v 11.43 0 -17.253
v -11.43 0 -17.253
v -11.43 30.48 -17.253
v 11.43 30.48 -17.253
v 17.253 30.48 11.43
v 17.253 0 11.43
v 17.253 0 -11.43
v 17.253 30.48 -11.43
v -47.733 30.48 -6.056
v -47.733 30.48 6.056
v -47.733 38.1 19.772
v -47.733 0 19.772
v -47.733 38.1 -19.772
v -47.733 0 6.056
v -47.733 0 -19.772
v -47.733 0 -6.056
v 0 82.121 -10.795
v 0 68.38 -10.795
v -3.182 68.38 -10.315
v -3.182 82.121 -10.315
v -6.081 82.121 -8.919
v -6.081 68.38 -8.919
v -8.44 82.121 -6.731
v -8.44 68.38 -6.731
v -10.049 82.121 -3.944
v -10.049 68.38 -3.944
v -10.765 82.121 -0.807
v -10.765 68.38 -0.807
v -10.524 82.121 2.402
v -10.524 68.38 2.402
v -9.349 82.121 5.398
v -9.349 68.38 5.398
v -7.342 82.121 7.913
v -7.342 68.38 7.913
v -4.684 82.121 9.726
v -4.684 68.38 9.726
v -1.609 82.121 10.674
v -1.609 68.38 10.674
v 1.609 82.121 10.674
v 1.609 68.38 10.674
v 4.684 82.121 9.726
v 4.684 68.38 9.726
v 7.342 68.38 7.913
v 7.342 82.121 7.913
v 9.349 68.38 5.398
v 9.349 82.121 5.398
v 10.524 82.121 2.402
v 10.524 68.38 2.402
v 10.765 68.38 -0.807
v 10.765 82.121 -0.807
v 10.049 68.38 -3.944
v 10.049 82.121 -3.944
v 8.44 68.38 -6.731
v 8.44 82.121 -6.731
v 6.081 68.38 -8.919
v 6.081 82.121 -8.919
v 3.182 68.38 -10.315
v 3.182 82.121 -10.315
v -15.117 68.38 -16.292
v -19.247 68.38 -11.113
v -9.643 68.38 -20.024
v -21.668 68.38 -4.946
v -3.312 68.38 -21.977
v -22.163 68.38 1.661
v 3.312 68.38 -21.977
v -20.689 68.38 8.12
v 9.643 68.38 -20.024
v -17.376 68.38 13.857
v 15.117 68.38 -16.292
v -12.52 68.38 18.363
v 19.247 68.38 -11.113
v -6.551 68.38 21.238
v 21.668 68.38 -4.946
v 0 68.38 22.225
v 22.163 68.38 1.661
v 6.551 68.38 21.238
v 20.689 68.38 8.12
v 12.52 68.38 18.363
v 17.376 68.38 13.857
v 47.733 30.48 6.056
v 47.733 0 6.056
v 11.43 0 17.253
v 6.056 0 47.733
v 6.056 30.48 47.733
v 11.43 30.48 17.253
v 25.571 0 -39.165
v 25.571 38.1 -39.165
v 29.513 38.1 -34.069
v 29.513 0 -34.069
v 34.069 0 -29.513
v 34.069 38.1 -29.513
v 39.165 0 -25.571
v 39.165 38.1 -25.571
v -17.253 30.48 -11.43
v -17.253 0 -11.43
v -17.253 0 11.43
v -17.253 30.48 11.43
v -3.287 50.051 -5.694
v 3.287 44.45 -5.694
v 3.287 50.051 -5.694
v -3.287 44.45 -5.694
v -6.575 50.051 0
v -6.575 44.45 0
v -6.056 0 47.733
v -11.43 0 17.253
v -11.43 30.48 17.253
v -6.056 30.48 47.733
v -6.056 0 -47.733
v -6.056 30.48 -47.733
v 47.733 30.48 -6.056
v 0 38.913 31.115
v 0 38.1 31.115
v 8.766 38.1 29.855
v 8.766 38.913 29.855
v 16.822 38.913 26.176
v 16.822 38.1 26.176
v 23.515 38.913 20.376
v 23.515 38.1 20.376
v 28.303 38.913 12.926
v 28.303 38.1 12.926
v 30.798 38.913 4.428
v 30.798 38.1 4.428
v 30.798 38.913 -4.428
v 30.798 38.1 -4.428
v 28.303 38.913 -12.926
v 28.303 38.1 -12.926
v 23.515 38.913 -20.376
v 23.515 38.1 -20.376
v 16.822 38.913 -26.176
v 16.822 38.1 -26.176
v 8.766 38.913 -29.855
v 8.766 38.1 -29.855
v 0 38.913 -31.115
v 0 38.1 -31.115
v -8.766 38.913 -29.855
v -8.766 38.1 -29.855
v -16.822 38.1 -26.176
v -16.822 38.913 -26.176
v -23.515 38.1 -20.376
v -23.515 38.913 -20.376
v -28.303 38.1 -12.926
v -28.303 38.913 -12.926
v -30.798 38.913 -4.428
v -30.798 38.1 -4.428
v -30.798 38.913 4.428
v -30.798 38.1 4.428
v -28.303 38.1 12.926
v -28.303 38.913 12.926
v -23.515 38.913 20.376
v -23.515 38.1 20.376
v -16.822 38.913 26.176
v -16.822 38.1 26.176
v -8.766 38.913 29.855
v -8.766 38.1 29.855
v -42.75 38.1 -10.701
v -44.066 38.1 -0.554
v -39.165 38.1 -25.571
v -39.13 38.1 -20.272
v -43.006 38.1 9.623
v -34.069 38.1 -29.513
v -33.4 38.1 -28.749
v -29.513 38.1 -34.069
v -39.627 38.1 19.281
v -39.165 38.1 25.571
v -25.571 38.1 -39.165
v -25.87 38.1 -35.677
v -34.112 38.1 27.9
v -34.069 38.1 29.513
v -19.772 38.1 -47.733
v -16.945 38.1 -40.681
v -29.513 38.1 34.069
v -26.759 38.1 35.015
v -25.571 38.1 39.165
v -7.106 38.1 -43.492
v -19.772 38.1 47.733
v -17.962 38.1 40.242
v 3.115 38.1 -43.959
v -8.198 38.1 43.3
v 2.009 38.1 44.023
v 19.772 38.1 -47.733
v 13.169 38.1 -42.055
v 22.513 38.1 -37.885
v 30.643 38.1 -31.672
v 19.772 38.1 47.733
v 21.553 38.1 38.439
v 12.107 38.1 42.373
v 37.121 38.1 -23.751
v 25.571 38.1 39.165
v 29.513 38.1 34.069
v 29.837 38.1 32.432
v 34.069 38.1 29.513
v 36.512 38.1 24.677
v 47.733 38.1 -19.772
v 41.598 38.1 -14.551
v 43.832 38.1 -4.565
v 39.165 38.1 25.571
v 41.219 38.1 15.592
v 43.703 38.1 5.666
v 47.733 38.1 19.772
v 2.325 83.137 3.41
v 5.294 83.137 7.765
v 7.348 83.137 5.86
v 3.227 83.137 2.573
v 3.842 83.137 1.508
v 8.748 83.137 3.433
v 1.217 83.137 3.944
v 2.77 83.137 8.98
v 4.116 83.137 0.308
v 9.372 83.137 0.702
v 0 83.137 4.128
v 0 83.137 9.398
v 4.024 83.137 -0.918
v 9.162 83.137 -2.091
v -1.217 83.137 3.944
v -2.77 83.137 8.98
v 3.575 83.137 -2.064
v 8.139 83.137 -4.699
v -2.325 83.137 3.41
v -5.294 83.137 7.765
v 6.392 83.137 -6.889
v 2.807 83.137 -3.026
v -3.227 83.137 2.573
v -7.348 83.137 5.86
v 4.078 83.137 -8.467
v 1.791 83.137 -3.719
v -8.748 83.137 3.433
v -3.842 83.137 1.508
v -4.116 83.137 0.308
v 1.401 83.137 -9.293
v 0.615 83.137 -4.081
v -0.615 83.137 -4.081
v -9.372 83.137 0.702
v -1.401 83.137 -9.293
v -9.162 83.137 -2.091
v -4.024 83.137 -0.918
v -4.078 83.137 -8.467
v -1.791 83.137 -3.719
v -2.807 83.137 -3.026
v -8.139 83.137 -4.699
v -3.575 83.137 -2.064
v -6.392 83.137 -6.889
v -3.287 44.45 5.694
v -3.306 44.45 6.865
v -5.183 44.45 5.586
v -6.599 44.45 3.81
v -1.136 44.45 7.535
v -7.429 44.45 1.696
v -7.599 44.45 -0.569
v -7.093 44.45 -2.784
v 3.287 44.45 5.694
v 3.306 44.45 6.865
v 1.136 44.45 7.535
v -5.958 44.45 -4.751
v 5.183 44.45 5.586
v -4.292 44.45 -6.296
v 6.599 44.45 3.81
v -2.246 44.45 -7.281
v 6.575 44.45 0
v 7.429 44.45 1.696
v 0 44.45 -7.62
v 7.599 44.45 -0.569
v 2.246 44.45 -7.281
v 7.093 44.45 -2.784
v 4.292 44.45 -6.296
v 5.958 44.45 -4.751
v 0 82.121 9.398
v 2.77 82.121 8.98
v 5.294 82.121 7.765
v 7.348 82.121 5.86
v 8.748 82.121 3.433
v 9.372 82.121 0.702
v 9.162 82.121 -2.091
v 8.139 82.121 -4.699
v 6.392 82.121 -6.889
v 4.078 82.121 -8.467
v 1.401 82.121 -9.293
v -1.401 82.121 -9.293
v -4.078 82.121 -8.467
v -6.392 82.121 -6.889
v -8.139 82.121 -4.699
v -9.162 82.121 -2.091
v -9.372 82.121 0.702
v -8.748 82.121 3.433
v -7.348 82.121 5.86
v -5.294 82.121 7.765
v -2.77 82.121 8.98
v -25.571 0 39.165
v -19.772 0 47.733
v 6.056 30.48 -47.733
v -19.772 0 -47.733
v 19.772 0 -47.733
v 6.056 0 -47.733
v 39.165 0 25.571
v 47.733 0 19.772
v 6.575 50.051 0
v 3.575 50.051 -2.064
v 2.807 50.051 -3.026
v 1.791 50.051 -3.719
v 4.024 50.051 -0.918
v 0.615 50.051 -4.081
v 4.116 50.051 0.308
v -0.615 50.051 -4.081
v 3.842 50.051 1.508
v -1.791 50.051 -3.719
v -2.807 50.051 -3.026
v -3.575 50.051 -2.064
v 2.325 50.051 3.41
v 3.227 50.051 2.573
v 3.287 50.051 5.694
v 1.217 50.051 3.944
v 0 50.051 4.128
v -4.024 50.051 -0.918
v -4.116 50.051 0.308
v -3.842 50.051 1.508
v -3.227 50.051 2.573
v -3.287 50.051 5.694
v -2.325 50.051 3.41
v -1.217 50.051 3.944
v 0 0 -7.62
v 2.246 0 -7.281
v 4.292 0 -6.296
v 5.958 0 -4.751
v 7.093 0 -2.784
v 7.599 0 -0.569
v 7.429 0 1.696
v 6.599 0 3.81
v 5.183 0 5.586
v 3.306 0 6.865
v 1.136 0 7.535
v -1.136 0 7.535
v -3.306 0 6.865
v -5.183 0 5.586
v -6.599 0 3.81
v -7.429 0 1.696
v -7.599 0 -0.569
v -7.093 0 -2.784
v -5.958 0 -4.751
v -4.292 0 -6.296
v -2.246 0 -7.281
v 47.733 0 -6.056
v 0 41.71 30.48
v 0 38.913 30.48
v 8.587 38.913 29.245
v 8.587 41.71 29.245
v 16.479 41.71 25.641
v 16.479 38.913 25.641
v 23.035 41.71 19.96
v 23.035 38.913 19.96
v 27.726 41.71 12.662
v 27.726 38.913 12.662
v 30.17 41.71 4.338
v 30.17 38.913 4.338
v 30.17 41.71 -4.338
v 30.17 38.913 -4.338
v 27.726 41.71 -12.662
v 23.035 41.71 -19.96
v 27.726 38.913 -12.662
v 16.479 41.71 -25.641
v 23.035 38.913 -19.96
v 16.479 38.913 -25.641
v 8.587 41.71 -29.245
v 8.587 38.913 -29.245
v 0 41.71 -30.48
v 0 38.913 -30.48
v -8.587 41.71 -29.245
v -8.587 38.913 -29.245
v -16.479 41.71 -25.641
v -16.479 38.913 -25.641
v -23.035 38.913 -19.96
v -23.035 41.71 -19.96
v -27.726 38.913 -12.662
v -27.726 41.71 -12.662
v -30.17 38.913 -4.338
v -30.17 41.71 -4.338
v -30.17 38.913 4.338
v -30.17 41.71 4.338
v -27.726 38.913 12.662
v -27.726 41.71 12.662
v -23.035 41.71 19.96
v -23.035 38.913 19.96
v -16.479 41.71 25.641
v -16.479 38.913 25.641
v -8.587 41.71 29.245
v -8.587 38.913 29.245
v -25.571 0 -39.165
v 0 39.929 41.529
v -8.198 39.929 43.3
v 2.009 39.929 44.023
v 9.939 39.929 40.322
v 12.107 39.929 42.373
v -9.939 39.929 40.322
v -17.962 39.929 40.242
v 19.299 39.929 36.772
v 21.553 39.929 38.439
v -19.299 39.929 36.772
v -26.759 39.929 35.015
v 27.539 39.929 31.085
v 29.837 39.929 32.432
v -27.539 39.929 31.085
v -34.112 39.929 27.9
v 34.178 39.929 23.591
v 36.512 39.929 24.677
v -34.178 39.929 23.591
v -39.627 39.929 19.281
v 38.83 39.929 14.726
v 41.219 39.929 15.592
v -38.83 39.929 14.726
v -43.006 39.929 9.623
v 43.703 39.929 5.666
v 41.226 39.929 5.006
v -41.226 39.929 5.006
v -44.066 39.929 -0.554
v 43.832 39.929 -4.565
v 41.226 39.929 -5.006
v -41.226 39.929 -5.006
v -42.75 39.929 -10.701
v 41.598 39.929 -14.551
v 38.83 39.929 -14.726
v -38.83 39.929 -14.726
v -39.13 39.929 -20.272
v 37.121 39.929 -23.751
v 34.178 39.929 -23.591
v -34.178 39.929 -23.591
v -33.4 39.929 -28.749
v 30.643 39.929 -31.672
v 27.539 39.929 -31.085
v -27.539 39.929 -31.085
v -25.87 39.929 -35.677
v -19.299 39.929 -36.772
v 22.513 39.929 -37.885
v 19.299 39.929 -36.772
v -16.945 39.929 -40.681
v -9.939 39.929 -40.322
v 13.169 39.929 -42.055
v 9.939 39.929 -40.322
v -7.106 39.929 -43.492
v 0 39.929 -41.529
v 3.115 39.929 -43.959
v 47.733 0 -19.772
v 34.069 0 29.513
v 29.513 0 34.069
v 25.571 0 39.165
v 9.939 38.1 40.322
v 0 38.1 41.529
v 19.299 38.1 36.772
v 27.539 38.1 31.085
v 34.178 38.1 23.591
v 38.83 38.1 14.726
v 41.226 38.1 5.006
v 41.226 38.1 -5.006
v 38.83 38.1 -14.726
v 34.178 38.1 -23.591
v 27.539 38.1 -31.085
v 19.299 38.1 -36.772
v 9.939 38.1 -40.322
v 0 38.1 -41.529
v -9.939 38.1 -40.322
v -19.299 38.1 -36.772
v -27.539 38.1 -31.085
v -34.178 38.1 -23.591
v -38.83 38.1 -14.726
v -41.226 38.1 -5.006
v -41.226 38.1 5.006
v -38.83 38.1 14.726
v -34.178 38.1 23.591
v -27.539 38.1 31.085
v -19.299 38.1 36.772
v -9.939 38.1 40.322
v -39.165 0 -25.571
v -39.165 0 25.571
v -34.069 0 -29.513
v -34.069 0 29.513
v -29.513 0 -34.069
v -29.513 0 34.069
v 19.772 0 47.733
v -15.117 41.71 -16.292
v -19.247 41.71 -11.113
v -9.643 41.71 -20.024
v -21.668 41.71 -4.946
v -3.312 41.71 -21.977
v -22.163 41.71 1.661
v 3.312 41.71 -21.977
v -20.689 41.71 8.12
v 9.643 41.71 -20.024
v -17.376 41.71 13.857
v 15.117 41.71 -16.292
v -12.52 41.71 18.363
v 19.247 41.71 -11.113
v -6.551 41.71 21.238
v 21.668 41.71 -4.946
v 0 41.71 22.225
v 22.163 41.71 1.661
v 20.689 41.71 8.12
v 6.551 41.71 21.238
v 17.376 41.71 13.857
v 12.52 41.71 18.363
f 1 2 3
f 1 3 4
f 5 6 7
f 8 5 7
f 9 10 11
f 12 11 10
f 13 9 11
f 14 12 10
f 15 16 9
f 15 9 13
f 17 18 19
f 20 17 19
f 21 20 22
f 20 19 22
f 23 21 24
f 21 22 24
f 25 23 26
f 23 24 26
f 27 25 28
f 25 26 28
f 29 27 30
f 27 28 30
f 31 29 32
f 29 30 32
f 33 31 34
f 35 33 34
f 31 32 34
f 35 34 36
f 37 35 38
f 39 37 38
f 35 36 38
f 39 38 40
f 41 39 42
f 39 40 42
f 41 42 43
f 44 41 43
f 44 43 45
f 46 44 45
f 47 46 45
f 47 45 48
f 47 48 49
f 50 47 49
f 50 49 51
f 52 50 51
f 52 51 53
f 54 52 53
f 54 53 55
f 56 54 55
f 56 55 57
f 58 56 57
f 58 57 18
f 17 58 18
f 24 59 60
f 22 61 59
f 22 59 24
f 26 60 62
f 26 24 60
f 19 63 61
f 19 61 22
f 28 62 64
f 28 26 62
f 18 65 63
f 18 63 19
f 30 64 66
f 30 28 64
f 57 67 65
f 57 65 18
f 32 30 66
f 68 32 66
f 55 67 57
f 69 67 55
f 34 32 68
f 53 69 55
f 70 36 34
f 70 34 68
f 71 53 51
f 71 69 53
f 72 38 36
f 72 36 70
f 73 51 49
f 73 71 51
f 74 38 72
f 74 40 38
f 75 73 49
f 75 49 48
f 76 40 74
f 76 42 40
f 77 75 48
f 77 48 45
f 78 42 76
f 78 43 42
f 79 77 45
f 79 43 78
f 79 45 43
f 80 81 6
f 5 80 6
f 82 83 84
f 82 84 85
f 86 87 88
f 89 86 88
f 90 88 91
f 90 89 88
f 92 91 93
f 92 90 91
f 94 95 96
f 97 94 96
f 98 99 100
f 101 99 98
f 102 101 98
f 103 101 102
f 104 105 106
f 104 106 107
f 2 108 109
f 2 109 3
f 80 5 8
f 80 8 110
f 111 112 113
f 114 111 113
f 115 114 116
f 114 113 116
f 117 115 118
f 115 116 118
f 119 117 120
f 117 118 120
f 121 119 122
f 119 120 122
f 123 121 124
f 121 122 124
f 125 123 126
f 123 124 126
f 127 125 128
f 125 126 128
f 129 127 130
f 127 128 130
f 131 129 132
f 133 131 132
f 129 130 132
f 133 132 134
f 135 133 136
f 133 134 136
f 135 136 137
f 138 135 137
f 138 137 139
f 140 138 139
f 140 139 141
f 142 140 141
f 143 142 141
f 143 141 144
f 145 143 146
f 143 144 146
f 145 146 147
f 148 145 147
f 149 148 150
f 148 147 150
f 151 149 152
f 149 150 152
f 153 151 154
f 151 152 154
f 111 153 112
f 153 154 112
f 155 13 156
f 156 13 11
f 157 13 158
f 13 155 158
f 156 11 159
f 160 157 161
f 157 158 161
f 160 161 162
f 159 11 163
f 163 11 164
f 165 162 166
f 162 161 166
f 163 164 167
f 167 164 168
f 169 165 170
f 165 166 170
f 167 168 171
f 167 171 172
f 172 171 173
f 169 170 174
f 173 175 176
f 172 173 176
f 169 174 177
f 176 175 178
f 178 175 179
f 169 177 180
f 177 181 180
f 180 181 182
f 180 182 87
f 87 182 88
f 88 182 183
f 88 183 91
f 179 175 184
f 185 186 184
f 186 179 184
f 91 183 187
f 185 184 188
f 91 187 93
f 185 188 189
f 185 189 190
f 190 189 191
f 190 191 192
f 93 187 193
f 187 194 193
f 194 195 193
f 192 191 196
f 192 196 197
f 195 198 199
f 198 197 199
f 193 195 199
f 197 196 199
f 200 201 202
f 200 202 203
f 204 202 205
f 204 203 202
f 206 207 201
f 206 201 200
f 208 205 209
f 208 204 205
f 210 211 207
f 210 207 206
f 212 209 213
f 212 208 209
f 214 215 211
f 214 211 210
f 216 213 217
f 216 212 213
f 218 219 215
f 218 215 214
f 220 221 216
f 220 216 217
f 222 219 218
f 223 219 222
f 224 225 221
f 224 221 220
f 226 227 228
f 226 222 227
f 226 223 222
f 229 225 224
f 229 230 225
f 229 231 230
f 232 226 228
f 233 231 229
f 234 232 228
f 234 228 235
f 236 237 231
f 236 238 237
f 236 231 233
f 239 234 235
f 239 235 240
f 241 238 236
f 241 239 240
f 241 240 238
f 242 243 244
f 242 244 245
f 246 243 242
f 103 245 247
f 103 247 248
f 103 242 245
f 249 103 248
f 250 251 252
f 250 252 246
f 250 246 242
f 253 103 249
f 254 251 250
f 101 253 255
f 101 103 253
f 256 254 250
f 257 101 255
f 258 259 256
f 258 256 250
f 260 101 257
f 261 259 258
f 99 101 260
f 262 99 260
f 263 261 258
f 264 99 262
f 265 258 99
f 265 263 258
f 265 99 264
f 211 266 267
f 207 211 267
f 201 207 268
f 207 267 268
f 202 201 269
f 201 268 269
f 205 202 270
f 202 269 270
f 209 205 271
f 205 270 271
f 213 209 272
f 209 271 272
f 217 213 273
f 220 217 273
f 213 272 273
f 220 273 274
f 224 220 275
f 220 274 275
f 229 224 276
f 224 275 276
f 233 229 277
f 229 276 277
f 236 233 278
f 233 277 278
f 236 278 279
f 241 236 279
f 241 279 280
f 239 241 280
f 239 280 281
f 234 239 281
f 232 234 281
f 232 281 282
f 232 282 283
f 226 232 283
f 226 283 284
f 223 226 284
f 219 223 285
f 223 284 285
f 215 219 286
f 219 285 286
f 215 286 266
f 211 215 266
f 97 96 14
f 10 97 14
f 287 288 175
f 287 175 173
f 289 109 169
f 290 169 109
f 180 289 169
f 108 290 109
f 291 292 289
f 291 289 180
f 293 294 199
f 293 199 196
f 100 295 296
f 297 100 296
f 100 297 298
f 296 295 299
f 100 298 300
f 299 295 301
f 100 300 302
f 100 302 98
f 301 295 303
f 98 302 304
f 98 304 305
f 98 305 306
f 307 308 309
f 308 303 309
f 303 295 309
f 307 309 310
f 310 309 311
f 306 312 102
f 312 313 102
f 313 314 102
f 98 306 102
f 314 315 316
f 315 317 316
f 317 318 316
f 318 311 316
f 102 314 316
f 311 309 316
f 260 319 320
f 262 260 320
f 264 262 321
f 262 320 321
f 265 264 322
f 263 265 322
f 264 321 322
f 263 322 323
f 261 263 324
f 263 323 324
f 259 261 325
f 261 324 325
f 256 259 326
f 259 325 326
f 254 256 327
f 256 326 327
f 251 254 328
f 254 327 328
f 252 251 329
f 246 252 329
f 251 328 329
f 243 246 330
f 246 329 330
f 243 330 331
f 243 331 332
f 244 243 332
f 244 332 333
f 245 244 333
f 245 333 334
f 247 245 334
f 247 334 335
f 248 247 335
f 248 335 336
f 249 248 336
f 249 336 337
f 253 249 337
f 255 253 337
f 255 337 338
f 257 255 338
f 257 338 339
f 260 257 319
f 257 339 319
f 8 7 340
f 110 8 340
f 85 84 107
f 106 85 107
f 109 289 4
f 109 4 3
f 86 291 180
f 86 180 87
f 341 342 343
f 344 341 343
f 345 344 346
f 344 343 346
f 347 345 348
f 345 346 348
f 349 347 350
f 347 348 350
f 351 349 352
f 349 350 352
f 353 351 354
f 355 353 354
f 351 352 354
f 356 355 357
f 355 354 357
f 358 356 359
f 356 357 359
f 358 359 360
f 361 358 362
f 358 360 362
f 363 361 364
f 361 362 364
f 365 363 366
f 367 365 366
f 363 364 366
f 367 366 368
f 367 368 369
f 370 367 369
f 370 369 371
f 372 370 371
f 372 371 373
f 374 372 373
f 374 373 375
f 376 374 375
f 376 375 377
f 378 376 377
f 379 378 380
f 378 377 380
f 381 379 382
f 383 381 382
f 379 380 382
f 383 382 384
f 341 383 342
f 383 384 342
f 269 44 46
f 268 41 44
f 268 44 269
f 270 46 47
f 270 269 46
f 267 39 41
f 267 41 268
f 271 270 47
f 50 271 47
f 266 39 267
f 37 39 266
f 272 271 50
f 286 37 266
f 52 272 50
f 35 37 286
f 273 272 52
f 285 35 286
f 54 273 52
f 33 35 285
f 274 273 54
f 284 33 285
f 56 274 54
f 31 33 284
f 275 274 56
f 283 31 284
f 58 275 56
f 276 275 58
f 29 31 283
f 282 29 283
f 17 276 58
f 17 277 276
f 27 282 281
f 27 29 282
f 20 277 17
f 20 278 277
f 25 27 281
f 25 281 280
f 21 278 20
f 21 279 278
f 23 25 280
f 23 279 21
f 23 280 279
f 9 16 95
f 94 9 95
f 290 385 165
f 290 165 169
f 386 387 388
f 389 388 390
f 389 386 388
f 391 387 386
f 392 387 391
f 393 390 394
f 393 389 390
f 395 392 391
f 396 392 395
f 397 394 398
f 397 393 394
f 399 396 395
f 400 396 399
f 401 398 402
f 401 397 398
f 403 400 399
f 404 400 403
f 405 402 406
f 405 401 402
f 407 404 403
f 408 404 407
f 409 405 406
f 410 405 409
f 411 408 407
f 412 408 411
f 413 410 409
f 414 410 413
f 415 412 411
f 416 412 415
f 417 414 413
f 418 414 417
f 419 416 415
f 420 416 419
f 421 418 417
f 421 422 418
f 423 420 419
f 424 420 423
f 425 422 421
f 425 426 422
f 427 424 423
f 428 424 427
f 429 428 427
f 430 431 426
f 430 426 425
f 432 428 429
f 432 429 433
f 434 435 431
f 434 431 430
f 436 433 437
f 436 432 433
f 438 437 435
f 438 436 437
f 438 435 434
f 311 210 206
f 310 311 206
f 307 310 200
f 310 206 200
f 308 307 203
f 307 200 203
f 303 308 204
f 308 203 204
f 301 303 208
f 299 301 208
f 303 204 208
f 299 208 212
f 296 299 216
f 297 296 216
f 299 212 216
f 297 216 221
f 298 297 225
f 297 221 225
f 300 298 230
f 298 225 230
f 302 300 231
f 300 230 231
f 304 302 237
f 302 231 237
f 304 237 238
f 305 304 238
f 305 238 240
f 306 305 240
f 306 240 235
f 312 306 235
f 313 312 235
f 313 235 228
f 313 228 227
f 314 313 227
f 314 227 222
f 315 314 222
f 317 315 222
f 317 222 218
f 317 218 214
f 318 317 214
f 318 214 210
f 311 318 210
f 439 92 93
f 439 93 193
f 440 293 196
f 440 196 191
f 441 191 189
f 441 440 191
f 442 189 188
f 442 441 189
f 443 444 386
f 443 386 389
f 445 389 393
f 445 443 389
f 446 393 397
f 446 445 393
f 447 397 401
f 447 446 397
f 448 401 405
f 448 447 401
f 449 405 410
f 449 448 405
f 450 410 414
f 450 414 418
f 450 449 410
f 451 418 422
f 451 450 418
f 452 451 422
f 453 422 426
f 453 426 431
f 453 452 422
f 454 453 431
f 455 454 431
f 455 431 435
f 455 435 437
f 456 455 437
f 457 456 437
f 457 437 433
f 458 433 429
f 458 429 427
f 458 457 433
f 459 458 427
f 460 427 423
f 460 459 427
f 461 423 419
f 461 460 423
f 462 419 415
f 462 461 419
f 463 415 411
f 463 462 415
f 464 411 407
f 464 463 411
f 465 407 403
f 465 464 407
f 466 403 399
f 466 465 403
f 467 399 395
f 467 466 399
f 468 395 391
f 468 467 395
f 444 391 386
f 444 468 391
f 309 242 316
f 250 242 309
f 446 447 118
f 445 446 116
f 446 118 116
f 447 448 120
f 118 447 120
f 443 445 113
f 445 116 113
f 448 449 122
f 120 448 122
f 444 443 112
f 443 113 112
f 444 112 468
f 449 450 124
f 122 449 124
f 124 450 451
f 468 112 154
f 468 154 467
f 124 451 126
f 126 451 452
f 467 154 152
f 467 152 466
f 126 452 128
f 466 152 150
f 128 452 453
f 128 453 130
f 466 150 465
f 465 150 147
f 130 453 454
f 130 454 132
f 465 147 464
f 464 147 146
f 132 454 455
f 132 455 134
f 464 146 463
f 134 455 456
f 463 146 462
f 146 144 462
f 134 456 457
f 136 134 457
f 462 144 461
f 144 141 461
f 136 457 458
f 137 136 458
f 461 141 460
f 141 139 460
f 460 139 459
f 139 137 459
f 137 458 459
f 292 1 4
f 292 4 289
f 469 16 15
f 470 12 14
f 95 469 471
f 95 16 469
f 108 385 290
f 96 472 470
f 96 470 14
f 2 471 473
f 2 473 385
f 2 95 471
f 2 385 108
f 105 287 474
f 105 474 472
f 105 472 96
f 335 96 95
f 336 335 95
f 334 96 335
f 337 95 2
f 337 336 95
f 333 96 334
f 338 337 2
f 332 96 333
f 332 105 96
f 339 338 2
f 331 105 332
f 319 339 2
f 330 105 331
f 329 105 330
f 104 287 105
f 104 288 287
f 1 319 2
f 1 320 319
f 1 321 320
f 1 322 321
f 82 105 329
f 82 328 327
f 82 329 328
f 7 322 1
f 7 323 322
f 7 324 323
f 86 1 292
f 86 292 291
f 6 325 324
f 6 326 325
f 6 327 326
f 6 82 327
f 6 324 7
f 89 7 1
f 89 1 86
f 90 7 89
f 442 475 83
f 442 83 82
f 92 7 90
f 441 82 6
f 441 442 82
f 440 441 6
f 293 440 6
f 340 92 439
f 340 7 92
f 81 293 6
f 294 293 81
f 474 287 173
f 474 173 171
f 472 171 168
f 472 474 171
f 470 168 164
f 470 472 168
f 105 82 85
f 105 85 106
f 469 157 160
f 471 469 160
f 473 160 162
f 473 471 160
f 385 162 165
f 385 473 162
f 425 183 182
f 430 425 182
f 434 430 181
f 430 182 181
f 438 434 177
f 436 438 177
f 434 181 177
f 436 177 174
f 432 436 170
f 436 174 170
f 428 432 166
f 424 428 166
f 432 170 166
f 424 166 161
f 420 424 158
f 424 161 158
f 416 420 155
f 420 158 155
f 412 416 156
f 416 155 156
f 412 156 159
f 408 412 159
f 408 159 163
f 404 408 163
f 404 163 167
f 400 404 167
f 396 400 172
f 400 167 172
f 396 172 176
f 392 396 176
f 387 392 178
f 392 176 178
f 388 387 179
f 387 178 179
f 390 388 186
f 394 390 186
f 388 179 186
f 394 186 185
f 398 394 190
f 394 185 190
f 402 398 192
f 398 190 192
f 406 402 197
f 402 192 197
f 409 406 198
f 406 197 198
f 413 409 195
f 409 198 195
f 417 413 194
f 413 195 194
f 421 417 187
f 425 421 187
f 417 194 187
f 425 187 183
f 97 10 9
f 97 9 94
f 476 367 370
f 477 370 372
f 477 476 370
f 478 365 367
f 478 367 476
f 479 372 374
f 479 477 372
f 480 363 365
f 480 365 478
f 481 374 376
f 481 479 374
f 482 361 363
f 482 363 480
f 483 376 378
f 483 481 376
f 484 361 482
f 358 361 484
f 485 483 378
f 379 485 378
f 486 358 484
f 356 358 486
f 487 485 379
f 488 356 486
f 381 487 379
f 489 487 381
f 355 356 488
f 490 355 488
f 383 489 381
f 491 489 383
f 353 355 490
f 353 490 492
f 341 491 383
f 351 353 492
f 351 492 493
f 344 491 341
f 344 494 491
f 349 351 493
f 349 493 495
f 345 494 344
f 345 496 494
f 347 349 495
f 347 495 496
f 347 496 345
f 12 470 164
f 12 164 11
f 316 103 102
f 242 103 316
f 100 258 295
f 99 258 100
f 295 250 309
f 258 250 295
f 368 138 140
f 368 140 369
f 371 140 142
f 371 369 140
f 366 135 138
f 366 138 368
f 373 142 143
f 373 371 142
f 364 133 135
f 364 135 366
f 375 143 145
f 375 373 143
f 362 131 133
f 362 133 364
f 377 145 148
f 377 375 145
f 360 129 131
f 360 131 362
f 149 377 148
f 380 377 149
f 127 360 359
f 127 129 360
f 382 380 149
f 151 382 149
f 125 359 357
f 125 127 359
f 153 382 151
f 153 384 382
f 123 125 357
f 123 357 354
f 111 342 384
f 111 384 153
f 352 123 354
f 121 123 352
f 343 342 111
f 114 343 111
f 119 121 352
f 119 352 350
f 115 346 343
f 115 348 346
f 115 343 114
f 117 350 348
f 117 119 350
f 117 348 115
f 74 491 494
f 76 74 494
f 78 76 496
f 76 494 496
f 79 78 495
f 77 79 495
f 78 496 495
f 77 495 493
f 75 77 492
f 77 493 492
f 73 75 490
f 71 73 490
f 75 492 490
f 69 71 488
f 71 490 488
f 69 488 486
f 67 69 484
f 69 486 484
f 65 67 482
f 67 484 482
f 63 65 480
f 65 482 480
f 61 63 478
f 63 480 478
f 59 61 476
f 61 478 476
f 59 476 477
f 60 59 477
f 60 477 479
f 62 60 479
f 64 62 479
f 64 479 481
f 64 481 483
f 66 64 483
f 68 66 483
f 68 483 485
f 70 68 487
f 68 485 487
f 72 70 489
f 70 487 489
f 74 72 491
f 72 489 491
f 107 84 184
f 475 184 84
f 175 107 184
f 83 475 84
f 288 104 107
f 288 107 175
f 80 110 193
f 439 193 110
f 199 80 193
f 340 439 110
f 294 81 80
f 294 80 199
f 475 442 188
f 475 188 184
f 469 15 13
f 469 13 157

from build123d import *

# Parameters (mm, degrees)
BASE_DEPTH                = 38.1
DOVETAIL_CUTS_DEPTH       = 30.48
SKETCH3_R                 = 31.115
LOWER_WASHER_LIP_DEPTH    = 0.8128
SKETCH4_R                 = 44.069
SKETCH4_R_2               = 41.529
RETAINING_LIP_DEPTH       = 1.8288
SKETCH6_R                 = 30.48
UPPER_BEARING_LIP_DEPTH   = 2.797175
SKETCH7_R                 = 22.225
CENTRAL_SHAFT_DEPTH       = 26.67
SKETCH5_R                 = 7.62
NUT_CLEARANCE_SHAFT_DEPTH = 44.45
SKETCH8_R                 = 10.795
THROUGH_SHAFT_DEPTH       = 14.7574
SKETCH9_R                 = 4.1275
THROUGH_HOLE_DEPTH        = 108.091797456
NUT_SLOT_DEPTH            = 5.6007
UPPER_START               = -1.016
SKETCH11_R                = 10.795
SKETCH11_R_2              = 9.398
UPPER_WASHER_LIP_DEPTH    = 1.016
FILLET2_R                 = 50.8


with BuildPart() as part:
    # Sketch1 → Base (new body)
    with BuildSketch(Plane(origin=(0, 0, 0), x_dir=(1, 0, 0), z_dir=(0, 1, 0))):
        Polygon((-47.732745366, -19.7715505), (-47.732745366, 19.7715505), (-31.058071097, 31.058071097), (-19.7715505, 47.732745366), (19.7715505, 47.732745366), (31.058071097, 31.058071097), (47.732745366, 19.7715505), (47.732745366, -19.7715505), (31.058071097, -31.058071097), (19.7715505, -47.732745366), (-19.7715505, -47.732745366), (-31.058071097, -31.058071097), align=None)
    extrude(amount=BASE_DEPTH)

    # Sketch2 → Dovetail cuts (cut)
    with BuildSketch(Plane.XZ):
        Polygon((6.055553628, -47.732745366), (-6.055553628, -47.732745366), (-11.43, -17.252745366), (11.43, -17.252745366), align=None)
        Polygon((-17.252745366, -11.43), (-17.252745366, 11.43), (-47.732745366, 6.055553628), (-47.732745366, -6.055553628), align=None)
        Polygon((17.252745366, 11.43), (17.252745366, -11.43), (47.732745366, -6.055553628), (47.732745366, 6.055553628), align=None)
        Polygon((6.055553628, 47.732745366), (11.43, 17.252745366), (-11.43, 17.252745366), (-6.055553628, 47.732745366), align=None)
    extrude(amount=-DOVETAIL_CUTS_DEPTH, mode=Mode.SUBTRACT)

    # Sketch3 → Lower washer lip (add)
    with BuildSketch(Plane(origin=(0, 38.1, 0), x_dir=(1, 0, 0), z_dir=(0, 1, 0))):
        with Locations(Location((0, 0, 0), (0, 0, 270))):
            Circle(SKETCH3_R)
    extrude(amount=LOWER_WASHER_LIP_DEPTH)

    # Sketch4 → Retaining lip (add)
    with BuildSketch(Plane(origin=(0, 38.1, 0), x_dir=(1, 0, 0), z_dir=(0, 1, 0))):
        with Locations(Location((0, 0, 0), (0, 0, 45.946261879))):
            Circle(SKETCH4_R)
        with Locations(Location((0, 0, 0), (0, 0, 270))):
            Circle(SKETCH4_R_2, mode=Mode.SUBTRACT)
    extrude(amount=RETAINING_LIP_DEPTH)

    # Sketch6 → Upper bearing lip (add)
    with BuildSketch(Plane(origin=(0, 38.9128, 0), x_dir=(1, 0, 0), z_dir=(0, 1, 0))):
        with Locations(Location((0, 0, 0), (0, 0, 270))):
            Circle(SKETCH6_R)
    extrude(amount=UPPER_BEARING_LIP_DEPTH)

    # Sketch7 → Central shaft (add)
    with BuildSketch(Plane(origin=(0, 41.709975, 0), x_dir=(1, 0, 0), z_dir=(0, 1, 0))):
        with Locations(Location((0, 0, 0), (0, 0, 270))):
            Circle(SKETCH7_R)
    extrude(amount=CENTRAL_SHAFT_DEPTH)

    # Sketch5 → Nut clearance shaft (cut)
    with BuildSketch(Plane.XZ):
        with Locations(Location((0, 0, 0), (0, 0, 270))):
            Circle(SKETCH5_R)
    extrude(amount=-NUT_CLEARANCE_SHAFT_DEPTH, mode=Mode.SUBTRACT)

    # Sketch8 → Through Shaft (add)
    with BuildSketch(Plane(origin=(0, 68.379975, 0), x_dir=(1, 0, 0), z_dir=(0, 1, 0))):
        with Locations(Location((0, 0, 0), (0, 0, 90))):
            Circle(SKETCH8_R)
    extrude(amount=THROUGH_SHAFT_DEPTH)

    # Sketch9 → Through Hole (cut, through all)
    with BuildSketch(Plane(origin=(0, 83.137375, 0), x_dir=(1, 0, 0), z_dir=(0, 1, 0))):
        with Locations(Location((0, 0, 0), (0, 0, 270))):
            Circle(SKETCH9_R)
    extrude(amount=-THROUGH_HOLE_DEPTH, mode=Mode.SUBTRACT)

    # Sketch10 → Nut slot (cut)
    with BuildSketch(Plane.XZ.offset(-44.45)):
        Polygon((3.287458414, 5.694045), (6.574916827, 0), (3.287458414, -5.694045), (-3.287458414, -5.694045), (-6.574916827, 0), (-3.287458414, 5.694045), align=None)
    extrude(amount=-NUT_SLOT_DEPTH, mode=Mode.SUBTRACT)

    # Sketch11 → Upper washer lip (cut)
    with BuildSketch(Plane(origin=(0, 83.137375, 0), x_dir=(1, 0, 0), z_dir=(0, 1, 0)).offset(UPPER_START)):
        with Locations(Location((0, 0, 0), (0, 0, 90))):
            Circle(SKETCH11_R)
        with Locations(Location((0, 0, 0), (0, 0, 270))):
            Circle(SKETCH11_R_2, mode=Mode.SUBTRACT)
    extrude(amount=UPPER_WASHER_LIP_DEPTH, mode=Mode.SUBTRACT)

    # Fillet2
    # the kernel refuses this fillet: 50.8 mm, written as the material it adds along each edge
    with BuildSketch(Plane(origin=(-31.058071097, 0, 31.058071097), x_dir=(-0.8281314013708309, 0, -0.5605340150816753), z_dir=(0, 1, 0)), Plane(origin=(31.058071097, 0, 31.058071097), x_dir=(-0.5605340150816742, 0, 0.8281314013708316), z_dir=(0, 1, 0))) as fillet2_piece_1:
        with BuildLine():
            CenterArc((FILLET2_R * 0.192701123769, FILLET2_R), FILLET2_R, 248.185472983, 21.814527017)
            Line((-FILLET2_R * 0.178902112104, FILLET2_R * 0.0716083611488), (0, 0))
            Line((0, 0), (FILLET2_R * 0.192701123769, 0))
        make_face()
    extrude(amount=38.1)
    with BuildSketch(Plane(origin=(-31.058071097, 0, -31.058071097), x_dir=(-0.8281314013708309, 0, 0.5605340150816753), z_dir=(0, 1, 0)), Plane(origin=(31.058071097, 0, -31.058071097), x_dir=(-0.5605340150816742, 0, -0.8281314013708316), z_dir=(0, 1, 0))) as fillet2_piece_2:
        with BuildLine():
            CenterArc((FILLET2_R * 0.192701123769, -FILLET2_R), FILLET2_R, 90, 21.814527017)
            Line((-FILLET2_R * 0.178902112104, -FILLET2_R * 0.0716083611488), (0, 0))
            Line((0, 0), (FILLET2_R * 0.192701123769, 0))
        make_face()
    extrude(amount=38.1)


solid = part.part
